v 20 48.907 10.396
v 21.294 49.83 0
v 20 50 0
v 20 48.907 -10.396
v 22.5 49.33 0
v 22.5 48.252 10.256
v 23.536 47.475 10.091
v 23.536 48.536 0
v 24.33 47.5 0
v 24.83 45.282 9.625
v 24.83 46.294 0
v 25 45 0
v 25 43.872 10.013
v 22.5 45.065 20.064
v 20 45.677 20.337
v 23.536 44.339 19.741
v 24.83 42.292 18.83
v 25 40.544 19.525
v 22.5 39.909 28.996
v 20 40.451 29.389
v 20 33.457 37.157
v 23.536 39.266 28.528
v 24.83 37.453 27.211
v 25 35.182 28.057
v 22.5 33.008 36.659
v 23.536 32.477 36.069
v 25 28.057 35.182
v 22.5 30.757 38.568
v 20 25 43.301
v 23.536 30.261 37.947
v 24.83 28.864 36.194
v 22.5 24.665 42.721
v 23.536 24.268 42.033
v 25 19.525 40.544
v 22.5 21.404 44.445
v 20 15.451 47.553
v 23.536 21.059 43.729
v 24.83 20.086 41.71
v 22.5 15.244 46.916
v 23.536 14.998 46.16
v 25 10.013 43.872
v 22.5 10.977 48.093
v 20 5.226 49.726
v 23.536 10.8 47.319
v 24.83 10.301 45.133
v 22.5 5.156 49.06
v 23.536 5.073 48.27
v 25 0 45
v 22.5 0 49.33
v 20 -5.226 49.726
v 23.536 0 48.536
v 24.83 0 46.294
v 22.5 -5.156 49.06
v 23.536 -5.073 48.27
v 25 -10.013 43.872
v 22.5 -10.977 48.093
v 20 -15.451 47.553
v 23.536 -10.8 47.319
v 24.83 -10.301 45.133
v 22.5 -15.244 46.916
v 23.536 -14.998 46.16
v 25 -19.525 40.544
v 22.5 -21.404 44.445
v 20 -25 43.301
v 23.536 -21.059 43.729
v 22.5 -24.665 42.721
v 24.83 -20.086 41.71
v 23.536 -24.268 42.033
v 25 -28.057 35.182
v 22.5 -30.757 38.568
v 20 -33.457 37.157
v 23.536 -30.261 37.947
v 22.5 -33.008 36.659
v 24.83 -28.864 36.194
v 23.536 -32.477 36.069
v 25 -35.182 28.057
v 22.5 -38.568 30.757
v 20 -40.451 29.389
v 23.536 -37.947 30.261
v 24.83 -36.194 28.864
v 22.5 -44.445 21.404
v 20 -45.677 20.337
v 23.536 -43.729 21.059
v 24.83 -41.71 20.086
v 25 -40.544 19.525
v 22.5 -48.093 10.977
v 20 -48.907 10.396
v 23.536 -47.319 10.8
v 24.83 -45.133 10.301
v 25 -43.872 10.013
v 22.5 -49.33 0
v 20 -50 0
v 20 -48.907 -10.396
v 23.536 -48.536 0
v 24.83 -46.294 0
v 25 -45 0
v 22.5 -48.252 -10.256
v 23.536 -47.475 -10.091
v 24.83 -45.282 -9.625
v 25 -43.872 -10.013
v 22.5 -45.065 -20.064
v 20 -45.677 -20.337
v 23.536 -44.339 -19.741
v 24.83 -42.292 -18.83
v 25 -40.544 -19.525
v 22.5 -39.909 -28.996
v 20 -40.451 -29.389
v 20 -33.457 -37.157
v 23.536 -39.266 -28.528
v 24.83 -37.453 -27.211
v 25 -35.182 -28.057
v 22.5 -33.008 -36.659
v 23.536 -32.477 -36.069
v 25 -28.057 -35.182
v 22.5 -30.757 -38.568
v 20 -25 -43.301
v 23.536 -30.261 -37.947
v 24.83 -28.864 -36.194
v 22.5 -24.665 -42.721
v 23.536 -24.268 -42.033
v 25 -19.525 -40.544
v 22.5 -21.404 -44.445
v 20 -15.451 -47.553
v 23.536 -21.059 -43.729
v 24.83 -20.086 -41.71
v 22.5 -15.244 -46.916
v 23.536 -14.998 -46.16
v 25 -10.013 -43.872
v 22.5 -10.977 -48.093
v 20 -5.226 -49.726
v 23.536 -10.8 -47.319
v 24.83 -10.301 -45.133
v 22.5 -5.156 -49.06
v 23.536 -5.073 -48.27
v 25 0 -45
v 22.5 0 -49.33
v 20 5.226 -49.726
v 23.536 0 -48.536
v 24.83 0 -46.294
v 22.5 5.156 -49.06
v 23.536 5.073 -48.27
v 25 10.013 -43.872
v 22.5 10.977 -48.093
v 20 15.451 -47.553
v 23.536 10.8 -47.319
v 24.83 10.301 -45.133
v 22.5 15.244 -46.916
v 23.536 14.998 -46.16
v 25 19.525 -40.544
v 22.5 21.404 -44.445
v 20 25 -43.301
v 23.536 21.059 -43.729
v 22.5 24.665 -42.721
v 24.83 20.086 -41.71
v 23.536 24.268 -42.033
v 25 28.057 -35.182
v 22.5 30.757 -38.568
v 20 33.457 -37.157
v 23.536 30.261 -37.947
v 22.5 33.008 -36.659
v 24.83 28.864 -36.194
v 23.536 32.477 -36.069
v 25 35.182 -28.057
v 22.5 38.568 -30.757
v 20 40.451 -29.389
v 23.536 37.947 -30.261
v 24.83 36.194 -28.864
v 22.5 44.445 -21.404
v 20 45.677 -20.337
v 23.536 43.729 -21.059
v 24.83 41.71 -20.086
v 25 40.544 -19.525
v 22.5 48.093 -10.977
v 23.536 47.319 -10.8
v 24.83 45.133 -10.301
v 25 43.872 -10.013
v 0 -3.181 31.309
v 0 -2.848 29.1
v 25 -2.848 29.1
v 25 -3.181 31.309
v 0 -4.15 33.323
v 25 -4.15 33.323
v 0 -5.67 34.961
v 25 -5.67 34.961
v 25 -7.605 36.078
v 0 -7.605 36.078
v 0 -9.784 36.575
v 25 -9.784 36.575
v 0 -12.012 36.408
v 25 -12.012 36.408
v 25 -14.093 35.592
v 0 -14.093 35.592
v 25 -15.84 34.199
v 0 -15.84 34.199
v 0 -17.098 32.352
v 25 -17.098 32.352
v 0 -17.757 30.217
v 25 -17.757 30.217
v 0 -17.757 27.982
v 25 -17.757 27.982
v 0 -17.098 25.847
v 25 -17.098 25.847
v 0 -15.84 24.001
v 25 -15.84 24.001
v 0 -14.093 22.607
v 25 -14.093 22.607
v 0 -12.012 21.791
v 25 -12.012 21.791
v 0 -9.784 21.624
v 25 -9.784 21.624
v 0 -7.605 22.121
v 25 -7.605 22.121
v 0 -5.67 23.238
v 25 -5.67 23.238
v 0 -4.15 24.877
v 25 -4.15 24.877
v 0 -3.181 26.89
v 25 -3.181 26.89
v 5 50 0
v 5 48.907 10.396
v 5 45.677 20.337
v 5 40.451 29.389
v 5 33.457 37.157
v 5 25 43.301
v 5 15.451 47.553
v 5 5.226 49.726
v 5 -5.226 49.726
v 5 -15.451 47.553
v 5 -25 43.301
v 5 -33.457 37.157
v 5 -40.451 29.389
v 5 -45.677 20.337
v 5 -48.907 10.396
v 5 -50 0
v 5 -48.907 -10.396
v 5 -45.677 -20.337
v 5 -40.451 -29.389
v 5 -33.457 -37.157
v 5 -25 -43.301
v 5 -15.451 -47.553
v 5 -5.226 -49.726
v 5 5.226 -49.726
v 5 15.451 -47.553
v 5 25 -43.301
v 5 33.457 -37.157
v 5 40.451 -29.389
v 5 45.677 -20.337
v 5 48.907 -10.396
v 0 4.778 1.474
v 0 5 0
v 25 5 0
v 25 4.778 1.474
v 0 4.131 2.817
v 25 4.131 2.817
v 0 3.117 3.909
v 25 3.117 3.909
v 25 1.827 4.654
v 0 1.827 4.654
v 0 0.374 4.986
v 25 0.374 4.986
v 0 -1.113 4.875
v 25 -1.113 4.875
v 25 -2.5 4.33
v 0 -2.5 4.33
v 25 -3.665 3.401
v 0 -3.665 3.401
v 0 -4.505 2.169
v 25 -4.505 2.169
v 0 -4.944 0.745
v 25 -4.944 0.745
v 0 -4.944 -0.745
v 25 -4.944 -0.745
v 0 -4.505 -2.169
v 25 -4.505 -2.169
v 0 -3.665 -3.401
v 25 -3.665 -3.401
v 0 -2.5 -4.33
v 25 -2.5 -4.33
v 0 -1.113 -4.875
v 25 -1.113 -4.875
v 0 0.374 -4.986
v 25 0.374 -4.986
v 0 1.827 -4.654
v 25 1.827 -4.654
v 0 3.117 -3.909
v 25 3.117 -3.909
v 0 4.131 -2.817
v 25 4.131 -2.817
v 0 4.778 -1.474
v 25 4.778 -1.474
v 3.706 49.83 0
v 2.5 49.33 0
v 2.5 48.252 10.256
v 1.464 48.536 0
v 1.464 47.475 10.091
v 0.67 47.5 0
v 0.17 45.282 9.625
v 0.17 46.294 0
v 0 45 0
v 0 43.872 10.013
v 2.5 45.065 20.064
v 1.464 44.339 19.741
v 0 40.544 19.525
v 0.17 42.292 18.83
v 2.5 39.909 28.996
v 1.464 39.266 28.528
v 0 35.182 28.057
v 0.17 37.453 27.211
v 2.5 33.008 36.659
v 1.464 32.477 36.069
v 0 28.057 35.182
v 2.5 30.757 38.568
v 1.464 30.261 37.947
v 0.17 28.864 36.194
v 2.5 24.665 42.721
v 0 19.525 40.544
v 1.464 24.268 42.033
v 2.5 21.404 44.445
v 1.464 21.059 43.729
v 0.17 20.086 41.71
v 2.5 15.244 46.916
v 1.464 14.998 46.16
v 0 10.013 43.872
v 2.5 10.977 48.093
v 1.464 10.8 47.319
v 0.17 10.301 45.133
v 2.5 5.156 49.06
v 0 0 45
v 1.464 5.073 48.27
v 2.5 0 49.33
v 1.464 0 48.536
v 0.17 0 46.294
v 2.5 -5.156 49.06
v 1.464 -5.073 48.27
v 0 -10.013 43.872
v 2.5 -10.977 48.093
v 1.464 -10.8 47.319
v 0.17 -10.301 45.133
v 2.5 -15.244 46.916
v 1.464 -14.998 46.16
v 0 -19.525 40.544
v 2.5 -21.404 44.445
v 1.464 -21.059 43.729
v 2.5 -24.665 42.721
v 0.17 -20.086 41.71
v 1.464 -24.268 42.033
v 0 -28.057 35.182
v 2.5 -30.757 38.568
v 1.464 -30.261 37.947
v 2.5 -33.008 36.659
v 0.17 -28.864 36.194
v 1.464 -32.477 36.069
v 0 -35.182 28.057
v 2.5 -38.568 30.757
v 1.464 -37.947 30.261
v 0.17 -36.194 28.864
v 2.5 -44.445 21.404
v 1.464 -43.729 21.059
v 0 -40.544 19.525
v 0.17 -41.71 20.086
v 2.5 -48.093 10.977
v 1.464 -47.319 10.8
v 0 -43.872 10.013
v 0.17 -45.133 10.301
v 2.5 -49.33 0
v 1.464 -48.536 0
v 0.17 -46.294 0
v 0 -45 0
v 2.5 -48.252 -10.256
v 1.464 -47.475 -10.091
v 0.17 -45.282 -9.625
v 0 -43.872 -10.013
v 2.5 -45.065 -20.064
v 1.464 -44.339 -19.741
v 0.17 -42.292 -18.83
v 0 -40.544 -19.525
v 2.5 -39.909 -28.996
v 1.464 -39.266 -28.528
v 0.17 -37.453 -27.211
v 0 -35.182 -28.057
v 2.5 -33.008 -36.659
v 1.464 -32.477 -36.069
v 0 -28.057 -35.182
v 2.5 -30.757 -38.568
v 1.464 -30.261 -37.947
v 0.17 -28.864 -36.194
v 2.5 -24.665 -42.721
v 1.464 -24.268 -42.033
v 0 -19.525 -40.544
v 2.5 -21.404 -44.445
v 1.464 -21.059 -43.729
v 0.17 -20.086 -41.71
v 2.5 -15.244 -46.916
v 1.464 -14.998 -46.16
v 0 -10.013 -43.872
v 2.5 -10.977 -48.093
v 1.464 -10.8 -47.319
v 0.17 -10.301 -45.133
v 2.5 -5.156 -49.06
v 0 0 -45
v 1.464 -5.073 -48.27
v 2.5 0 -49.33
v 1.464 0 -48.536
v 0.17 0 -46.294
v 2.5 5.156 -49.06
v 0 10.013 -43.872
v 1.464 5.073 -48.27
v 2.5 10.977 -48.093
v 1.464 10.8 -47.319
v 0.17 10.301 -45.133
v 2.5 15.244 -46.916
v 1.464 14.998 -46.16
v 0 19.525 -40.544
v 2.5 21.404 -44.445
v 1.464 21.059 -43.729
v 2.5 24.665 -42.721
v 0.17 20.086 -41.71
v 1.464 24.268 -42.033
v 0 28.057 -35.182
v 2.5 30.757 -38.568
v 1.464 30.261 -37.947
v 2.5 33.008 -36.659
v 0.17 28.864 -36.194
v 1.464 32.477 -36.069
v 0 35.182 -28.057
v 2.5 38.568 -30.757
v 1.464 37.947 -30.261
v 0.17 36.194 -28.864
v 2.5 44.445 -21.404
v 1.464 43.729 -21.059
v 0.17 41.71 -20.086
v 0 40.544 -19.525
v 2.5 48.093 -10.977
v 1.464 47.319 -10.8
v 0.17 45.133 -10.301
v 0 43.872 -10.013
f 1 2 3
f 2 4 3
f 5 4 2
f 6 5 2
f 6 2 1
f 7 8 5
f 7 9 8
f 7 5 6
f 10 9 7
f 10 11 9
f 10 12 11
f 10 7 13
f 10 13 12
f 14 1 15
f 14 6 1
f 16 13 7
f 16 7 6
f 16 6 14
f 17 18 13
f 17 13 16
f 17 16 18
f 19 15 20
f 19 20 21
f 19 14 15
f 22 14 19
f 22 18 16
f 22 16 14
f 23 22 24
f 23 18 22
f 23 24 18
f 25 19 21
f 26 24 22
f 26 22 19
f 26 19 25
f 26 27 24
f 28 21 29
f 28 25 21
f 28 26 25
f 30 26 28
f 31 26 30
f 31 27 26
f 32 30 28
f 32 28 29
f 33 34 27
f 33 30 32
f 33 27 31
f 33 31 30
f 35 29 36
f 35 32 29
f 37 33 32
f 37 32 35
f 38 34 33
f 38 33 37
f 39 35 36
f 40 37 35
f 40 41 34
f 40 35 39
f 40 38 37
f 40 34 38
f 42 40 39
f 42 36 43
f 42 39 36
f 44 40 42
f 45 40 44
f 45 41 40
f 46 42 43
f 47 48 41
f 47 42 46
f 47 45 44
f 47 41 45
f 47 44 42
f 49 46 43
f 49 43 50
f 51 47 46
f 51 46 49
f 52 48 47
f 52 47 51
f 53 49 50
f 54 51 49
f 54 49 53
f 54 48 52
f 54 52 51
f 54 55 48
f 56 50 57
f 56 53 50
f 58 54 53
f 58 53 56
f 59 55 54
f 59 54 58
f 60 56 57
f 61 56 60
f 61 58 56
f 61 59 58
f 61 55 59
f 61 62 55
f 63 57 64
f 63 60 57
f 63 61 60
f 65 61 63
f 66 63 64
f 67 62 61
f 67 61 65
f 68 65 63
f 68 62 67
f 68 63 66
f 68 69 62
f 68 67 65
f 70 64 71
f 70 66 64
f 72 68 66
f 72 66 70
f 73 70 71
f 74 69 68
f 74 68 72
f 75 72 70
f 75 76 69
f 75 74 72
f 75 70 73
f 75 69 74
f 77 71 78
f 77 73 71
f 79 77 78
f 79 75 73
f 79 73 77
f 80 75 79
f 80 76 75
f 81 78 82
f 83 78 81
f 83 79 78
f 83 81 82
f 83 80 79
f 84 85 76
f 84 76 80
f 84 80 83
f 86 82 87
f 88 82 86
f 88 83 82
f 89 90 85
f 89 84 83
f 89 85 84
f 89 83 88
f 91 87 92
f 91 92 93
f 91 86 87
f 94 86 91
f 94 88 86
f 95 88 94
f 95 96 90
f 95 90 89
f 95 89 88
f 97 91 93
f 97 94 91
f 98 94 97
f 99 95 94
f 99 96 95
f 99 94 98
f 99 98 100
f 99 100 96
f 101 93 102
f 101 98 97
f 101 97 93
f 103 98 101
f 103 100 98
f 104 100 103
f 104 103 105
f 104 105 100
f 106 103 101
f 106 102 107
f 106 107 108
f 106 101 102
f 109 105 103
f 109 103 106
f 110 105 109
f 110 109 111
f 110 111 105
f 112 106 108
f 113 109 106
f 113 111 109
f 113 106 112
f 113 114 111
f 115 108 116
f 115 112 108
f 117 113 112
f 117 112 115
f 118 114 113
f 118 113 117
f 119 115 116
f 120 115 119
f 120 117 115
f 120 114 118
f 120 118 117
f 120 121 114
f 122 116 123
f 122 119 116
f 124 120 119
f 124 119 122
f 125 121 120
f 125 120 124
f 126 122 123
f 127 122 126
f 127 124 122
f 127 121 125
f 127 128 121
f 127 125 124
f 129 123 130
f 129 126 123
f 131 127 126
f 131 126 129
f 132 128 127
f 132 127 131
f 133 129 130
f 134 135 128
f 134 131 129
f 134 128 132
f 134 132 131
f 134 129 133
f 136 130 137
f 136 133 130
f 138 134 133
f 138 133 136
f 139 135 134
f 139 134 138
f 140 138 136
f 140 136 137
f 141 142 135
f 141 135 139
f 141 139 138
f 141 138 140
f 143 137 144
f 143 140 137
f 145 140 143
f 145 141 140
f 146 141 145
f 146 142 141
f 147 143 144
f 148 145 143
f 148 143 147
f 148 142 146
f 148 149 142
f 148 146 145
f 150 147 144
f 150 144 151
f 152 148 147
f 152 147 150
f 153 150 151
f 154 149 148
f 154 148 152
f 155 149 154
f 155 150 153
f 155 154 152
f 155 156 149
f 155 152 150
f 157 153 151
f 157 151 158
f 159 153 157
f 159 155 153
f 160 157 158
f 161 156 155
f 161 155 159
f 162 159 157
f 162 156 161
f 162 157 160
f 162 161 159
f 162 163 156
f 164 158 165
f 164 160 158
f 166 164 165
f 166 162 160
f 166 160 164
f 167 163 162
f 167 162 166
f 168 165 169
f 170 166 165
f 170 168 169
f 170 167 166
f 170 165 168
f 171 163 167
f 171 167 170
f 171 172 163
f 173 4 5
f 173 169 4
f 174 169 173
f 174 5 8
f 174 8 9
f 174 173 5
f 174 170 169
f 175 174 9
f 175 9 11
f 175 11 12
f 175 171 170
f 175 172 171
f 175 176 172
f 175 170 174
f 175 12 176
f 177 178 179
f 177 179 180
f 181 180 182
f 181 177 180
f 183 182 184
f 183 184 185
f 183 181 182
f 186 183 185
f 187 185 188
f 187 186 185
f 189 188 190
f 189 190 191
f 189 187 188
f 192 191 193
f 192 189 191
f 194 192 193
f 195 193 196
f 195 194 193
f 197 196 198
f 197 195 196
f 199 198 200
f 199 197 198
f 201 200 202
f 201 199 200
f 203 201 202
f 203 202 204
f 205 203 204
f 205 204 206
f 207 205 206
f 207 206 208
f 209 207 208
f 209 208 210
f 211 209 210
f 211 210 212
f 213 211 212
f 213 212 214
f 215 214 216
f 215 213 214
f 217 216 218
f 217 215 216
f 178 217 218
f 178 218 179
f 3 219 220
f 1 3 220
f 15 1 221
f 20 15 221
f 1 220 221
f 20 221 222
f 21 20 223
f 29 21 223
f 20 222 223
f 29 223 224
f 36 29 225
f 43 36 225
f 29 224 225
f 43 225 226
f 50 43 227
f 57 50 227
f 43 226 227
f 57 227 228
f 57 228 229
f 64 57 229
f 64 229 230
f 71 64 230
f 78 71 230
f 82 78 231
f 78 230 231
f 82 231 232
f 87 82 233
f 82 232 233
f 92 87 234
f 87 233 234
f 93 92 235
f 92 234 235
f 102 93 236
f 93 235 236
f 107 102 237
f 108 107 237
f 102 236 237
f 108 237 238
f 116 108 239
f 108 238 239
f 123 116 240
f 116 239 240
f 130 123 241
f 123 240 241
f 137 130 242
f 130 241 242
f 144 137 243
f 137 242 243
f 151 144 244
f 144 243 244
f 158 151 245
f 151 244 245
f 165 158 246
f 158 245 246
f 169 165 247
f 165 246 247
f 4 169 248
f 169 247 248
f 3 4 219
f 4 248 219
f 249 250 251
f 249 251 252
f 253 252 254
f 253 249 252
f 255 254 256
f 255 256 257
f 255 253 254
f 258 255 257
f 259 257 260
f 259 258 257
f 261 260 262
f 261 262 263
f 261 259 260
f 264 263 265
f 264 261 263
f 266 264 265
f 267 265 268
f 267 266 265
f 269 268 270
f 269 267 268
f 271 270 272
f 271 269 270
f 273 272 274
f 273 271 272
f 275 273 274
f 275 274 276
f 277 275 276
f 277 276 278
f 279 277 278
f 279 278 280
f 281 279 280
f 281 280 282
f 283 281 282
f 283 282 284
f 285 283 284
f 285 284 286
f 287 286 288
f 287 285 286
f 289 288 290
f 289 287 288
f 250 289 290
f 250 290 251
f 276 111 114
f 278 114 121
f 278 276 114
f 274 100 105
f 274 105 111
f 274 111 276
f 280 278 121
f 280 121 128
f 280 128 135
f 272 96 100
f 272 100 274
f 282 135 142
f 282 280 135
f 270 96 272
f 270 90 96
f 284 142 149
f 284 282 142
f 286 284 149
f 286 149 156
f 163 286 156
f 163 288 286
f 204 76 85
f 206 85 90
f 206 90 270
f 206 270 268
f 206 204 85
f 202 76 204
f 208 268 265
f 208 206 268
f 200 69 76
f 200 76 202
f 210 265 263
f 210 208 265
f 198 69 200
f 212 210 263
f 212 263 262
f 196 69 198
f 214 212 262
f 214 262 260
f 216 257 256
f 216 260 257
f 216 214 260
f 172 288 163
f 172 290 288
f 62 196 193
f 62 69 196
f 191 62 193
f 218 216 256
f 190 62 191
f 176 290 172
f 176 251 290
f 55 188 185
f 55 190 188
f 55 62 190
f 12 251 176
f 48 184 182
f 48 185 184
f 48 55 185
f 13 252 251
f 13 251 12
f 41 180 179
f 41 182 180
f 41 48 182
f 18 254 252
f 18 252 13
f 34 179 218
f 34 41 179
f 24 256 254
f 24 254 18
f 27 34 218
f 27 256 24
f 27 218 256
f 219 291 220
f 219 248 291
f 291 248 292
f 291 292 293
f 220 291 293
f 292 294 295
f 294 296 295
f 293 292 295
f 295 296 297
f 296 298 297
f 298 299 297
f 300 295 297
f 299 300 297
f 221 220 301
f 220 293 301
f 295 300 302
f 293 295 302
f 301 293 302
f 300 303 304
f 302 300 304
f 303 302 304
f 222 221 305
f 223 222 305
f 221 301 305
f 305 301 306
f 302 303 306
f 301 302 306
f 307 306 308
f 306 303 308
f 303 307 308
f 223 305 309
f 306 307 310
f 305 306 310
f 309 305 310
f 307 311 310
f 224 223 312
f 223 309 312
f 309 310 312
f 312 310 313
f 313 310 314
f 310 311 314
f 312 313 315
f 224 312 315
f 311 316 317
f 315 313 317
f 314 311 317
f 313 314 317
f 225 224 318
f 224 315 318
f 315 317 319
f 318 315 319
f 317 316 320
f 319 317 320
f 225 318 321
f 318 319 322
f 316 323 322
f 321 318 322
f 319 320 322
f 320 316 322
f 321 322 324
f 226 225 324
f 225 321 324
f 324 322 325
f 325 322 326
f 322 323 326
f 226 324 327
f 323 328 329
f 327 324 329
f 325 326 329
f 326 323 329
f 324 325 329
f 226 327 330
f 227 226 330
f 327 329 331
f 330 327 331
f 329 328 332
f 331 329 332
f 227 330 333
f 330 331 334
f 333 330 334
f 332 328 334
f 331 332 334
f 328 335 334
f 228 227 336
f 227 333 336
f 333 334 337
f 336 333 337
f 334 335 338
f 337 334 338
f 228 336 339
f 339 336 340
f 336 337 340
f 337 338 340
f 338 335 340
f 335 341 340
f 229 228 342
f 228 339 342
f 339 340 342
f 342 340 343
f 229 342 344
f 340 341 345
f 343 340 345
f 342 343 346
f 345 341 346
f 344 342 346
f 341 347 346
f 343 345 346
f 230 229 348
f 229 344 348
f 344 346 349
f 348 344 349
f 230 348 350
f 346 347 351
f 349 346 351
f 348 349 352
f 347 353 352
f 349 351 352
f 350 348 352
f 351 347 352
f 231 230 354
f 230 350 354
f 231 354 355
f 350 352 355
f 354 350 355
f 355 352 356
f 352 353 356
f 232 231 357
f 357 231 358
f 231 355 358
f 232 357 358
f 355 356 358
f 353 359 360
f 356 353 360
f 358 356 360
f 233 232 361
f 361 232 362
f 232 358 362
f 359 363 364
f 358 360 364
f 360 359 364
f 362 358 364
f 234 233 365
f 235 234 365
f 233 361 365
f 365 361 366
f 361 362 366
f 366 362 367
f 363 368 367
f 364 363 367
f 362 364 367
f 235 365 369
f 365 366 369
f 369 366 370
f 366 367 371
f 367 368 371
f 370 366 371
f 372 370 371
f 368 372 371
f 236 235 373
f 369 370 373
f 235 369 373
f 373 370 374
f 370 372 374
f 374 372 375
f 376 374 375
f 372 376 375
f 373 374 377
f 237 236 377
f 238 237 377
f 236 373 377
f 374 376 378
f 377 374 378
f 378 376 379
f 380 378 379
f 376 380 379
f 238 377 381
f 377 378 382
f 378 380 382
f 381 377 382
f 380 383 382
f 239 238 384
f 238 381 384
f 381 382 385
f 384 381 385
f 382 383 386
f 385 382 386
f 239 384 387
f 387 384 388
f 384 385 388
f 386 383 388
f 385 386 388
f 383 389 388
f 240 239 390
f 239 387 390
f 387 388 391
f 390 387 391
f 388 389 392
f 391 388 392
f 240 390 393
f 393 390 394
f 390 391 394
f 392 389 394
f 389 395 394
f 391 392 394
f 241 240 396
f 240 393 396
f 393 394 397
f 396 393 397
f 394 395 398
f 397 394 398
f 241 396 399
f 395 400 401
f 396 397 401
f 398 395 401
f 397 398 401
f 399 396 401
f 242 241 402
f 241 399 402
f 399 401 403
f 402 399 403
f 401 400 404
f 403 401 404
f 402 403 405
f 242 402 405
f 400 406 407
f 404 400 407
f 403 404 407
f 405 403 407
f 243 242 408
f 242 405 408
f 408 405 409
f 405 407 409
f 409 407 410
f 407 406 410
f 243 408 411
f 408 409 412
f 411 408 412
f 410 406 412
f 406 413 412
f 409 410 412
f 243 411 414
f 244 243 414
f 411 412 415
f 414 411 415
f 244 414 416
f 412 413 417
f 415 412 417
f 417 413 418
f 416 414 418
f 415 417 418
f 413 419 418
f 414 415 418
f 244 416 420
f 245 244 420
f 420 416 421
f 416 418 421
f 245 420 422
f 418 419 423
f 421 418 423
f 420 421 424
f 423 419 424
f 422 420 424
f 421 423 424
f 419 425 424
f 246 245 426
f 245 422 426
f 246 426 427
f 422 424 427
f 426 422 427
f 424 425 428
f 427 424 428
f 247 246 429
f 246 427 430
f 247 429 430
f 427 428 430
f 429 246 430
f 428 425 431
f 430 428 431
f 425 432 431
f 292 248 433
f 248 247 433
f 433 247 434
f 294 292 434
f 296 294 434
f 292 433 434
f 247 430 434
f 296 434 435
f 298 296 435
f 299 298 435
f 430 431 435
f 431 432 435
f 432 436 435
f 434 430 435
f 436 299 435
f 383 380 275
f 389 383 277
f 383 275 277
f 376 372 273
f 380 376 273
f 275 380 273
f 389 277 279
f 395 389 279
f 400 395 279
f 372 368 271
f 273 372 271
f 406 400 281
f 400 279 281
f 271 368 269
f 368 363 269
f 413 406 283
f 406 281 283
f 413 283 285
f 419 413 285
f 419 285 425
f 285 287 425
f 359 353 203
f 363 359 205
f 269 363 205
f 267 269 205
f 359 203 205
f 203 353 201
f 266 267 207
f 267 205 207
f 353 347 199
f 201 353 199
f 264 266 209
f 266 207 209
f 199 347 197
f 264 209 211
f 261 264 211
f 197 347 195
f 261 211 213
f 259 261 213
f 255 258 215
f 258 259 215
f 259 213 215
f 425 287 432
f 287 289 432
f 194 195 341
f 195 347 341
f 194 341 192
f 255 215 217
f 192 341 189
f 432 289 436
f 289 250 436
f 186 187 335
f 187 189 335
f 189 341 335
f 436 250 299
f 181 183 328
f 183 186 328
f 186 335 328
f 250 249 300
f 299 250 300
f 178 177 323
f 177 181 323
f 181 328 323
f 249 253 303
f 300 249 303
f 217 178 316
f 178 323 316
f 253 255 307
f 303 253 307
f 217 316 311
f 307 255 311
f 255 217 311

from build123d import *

# Parameters (mm, degrees)
F0_R     = 50
F0_R_2   = 7.496671
F0_R_3   = 5
F1_DEPTH = 25
F2_R     = 5


with BuildPart() as f1:
    # F0 (on Right) → F1 (new body)
    with BuildSketch(Plane.YZ):
        Circle(F0_R)
        with Locations((-10.344213, 29.099595)):
            Circle(F0_R_2, mode=Mode.SUBTRACT)
        Circle(F0_R_3, mode=Mode.SUBTRACT)
    extrude(amount=F1_DEPTH)

    # F2
    f2_edges = [f1.edges().sort_by_distance(p)[0] for p in [
        (25, -50, 0),
        (0, -50, 0),
    ]]
    fillet(f2_edges, radius=F2_R)


solid = f1.part
